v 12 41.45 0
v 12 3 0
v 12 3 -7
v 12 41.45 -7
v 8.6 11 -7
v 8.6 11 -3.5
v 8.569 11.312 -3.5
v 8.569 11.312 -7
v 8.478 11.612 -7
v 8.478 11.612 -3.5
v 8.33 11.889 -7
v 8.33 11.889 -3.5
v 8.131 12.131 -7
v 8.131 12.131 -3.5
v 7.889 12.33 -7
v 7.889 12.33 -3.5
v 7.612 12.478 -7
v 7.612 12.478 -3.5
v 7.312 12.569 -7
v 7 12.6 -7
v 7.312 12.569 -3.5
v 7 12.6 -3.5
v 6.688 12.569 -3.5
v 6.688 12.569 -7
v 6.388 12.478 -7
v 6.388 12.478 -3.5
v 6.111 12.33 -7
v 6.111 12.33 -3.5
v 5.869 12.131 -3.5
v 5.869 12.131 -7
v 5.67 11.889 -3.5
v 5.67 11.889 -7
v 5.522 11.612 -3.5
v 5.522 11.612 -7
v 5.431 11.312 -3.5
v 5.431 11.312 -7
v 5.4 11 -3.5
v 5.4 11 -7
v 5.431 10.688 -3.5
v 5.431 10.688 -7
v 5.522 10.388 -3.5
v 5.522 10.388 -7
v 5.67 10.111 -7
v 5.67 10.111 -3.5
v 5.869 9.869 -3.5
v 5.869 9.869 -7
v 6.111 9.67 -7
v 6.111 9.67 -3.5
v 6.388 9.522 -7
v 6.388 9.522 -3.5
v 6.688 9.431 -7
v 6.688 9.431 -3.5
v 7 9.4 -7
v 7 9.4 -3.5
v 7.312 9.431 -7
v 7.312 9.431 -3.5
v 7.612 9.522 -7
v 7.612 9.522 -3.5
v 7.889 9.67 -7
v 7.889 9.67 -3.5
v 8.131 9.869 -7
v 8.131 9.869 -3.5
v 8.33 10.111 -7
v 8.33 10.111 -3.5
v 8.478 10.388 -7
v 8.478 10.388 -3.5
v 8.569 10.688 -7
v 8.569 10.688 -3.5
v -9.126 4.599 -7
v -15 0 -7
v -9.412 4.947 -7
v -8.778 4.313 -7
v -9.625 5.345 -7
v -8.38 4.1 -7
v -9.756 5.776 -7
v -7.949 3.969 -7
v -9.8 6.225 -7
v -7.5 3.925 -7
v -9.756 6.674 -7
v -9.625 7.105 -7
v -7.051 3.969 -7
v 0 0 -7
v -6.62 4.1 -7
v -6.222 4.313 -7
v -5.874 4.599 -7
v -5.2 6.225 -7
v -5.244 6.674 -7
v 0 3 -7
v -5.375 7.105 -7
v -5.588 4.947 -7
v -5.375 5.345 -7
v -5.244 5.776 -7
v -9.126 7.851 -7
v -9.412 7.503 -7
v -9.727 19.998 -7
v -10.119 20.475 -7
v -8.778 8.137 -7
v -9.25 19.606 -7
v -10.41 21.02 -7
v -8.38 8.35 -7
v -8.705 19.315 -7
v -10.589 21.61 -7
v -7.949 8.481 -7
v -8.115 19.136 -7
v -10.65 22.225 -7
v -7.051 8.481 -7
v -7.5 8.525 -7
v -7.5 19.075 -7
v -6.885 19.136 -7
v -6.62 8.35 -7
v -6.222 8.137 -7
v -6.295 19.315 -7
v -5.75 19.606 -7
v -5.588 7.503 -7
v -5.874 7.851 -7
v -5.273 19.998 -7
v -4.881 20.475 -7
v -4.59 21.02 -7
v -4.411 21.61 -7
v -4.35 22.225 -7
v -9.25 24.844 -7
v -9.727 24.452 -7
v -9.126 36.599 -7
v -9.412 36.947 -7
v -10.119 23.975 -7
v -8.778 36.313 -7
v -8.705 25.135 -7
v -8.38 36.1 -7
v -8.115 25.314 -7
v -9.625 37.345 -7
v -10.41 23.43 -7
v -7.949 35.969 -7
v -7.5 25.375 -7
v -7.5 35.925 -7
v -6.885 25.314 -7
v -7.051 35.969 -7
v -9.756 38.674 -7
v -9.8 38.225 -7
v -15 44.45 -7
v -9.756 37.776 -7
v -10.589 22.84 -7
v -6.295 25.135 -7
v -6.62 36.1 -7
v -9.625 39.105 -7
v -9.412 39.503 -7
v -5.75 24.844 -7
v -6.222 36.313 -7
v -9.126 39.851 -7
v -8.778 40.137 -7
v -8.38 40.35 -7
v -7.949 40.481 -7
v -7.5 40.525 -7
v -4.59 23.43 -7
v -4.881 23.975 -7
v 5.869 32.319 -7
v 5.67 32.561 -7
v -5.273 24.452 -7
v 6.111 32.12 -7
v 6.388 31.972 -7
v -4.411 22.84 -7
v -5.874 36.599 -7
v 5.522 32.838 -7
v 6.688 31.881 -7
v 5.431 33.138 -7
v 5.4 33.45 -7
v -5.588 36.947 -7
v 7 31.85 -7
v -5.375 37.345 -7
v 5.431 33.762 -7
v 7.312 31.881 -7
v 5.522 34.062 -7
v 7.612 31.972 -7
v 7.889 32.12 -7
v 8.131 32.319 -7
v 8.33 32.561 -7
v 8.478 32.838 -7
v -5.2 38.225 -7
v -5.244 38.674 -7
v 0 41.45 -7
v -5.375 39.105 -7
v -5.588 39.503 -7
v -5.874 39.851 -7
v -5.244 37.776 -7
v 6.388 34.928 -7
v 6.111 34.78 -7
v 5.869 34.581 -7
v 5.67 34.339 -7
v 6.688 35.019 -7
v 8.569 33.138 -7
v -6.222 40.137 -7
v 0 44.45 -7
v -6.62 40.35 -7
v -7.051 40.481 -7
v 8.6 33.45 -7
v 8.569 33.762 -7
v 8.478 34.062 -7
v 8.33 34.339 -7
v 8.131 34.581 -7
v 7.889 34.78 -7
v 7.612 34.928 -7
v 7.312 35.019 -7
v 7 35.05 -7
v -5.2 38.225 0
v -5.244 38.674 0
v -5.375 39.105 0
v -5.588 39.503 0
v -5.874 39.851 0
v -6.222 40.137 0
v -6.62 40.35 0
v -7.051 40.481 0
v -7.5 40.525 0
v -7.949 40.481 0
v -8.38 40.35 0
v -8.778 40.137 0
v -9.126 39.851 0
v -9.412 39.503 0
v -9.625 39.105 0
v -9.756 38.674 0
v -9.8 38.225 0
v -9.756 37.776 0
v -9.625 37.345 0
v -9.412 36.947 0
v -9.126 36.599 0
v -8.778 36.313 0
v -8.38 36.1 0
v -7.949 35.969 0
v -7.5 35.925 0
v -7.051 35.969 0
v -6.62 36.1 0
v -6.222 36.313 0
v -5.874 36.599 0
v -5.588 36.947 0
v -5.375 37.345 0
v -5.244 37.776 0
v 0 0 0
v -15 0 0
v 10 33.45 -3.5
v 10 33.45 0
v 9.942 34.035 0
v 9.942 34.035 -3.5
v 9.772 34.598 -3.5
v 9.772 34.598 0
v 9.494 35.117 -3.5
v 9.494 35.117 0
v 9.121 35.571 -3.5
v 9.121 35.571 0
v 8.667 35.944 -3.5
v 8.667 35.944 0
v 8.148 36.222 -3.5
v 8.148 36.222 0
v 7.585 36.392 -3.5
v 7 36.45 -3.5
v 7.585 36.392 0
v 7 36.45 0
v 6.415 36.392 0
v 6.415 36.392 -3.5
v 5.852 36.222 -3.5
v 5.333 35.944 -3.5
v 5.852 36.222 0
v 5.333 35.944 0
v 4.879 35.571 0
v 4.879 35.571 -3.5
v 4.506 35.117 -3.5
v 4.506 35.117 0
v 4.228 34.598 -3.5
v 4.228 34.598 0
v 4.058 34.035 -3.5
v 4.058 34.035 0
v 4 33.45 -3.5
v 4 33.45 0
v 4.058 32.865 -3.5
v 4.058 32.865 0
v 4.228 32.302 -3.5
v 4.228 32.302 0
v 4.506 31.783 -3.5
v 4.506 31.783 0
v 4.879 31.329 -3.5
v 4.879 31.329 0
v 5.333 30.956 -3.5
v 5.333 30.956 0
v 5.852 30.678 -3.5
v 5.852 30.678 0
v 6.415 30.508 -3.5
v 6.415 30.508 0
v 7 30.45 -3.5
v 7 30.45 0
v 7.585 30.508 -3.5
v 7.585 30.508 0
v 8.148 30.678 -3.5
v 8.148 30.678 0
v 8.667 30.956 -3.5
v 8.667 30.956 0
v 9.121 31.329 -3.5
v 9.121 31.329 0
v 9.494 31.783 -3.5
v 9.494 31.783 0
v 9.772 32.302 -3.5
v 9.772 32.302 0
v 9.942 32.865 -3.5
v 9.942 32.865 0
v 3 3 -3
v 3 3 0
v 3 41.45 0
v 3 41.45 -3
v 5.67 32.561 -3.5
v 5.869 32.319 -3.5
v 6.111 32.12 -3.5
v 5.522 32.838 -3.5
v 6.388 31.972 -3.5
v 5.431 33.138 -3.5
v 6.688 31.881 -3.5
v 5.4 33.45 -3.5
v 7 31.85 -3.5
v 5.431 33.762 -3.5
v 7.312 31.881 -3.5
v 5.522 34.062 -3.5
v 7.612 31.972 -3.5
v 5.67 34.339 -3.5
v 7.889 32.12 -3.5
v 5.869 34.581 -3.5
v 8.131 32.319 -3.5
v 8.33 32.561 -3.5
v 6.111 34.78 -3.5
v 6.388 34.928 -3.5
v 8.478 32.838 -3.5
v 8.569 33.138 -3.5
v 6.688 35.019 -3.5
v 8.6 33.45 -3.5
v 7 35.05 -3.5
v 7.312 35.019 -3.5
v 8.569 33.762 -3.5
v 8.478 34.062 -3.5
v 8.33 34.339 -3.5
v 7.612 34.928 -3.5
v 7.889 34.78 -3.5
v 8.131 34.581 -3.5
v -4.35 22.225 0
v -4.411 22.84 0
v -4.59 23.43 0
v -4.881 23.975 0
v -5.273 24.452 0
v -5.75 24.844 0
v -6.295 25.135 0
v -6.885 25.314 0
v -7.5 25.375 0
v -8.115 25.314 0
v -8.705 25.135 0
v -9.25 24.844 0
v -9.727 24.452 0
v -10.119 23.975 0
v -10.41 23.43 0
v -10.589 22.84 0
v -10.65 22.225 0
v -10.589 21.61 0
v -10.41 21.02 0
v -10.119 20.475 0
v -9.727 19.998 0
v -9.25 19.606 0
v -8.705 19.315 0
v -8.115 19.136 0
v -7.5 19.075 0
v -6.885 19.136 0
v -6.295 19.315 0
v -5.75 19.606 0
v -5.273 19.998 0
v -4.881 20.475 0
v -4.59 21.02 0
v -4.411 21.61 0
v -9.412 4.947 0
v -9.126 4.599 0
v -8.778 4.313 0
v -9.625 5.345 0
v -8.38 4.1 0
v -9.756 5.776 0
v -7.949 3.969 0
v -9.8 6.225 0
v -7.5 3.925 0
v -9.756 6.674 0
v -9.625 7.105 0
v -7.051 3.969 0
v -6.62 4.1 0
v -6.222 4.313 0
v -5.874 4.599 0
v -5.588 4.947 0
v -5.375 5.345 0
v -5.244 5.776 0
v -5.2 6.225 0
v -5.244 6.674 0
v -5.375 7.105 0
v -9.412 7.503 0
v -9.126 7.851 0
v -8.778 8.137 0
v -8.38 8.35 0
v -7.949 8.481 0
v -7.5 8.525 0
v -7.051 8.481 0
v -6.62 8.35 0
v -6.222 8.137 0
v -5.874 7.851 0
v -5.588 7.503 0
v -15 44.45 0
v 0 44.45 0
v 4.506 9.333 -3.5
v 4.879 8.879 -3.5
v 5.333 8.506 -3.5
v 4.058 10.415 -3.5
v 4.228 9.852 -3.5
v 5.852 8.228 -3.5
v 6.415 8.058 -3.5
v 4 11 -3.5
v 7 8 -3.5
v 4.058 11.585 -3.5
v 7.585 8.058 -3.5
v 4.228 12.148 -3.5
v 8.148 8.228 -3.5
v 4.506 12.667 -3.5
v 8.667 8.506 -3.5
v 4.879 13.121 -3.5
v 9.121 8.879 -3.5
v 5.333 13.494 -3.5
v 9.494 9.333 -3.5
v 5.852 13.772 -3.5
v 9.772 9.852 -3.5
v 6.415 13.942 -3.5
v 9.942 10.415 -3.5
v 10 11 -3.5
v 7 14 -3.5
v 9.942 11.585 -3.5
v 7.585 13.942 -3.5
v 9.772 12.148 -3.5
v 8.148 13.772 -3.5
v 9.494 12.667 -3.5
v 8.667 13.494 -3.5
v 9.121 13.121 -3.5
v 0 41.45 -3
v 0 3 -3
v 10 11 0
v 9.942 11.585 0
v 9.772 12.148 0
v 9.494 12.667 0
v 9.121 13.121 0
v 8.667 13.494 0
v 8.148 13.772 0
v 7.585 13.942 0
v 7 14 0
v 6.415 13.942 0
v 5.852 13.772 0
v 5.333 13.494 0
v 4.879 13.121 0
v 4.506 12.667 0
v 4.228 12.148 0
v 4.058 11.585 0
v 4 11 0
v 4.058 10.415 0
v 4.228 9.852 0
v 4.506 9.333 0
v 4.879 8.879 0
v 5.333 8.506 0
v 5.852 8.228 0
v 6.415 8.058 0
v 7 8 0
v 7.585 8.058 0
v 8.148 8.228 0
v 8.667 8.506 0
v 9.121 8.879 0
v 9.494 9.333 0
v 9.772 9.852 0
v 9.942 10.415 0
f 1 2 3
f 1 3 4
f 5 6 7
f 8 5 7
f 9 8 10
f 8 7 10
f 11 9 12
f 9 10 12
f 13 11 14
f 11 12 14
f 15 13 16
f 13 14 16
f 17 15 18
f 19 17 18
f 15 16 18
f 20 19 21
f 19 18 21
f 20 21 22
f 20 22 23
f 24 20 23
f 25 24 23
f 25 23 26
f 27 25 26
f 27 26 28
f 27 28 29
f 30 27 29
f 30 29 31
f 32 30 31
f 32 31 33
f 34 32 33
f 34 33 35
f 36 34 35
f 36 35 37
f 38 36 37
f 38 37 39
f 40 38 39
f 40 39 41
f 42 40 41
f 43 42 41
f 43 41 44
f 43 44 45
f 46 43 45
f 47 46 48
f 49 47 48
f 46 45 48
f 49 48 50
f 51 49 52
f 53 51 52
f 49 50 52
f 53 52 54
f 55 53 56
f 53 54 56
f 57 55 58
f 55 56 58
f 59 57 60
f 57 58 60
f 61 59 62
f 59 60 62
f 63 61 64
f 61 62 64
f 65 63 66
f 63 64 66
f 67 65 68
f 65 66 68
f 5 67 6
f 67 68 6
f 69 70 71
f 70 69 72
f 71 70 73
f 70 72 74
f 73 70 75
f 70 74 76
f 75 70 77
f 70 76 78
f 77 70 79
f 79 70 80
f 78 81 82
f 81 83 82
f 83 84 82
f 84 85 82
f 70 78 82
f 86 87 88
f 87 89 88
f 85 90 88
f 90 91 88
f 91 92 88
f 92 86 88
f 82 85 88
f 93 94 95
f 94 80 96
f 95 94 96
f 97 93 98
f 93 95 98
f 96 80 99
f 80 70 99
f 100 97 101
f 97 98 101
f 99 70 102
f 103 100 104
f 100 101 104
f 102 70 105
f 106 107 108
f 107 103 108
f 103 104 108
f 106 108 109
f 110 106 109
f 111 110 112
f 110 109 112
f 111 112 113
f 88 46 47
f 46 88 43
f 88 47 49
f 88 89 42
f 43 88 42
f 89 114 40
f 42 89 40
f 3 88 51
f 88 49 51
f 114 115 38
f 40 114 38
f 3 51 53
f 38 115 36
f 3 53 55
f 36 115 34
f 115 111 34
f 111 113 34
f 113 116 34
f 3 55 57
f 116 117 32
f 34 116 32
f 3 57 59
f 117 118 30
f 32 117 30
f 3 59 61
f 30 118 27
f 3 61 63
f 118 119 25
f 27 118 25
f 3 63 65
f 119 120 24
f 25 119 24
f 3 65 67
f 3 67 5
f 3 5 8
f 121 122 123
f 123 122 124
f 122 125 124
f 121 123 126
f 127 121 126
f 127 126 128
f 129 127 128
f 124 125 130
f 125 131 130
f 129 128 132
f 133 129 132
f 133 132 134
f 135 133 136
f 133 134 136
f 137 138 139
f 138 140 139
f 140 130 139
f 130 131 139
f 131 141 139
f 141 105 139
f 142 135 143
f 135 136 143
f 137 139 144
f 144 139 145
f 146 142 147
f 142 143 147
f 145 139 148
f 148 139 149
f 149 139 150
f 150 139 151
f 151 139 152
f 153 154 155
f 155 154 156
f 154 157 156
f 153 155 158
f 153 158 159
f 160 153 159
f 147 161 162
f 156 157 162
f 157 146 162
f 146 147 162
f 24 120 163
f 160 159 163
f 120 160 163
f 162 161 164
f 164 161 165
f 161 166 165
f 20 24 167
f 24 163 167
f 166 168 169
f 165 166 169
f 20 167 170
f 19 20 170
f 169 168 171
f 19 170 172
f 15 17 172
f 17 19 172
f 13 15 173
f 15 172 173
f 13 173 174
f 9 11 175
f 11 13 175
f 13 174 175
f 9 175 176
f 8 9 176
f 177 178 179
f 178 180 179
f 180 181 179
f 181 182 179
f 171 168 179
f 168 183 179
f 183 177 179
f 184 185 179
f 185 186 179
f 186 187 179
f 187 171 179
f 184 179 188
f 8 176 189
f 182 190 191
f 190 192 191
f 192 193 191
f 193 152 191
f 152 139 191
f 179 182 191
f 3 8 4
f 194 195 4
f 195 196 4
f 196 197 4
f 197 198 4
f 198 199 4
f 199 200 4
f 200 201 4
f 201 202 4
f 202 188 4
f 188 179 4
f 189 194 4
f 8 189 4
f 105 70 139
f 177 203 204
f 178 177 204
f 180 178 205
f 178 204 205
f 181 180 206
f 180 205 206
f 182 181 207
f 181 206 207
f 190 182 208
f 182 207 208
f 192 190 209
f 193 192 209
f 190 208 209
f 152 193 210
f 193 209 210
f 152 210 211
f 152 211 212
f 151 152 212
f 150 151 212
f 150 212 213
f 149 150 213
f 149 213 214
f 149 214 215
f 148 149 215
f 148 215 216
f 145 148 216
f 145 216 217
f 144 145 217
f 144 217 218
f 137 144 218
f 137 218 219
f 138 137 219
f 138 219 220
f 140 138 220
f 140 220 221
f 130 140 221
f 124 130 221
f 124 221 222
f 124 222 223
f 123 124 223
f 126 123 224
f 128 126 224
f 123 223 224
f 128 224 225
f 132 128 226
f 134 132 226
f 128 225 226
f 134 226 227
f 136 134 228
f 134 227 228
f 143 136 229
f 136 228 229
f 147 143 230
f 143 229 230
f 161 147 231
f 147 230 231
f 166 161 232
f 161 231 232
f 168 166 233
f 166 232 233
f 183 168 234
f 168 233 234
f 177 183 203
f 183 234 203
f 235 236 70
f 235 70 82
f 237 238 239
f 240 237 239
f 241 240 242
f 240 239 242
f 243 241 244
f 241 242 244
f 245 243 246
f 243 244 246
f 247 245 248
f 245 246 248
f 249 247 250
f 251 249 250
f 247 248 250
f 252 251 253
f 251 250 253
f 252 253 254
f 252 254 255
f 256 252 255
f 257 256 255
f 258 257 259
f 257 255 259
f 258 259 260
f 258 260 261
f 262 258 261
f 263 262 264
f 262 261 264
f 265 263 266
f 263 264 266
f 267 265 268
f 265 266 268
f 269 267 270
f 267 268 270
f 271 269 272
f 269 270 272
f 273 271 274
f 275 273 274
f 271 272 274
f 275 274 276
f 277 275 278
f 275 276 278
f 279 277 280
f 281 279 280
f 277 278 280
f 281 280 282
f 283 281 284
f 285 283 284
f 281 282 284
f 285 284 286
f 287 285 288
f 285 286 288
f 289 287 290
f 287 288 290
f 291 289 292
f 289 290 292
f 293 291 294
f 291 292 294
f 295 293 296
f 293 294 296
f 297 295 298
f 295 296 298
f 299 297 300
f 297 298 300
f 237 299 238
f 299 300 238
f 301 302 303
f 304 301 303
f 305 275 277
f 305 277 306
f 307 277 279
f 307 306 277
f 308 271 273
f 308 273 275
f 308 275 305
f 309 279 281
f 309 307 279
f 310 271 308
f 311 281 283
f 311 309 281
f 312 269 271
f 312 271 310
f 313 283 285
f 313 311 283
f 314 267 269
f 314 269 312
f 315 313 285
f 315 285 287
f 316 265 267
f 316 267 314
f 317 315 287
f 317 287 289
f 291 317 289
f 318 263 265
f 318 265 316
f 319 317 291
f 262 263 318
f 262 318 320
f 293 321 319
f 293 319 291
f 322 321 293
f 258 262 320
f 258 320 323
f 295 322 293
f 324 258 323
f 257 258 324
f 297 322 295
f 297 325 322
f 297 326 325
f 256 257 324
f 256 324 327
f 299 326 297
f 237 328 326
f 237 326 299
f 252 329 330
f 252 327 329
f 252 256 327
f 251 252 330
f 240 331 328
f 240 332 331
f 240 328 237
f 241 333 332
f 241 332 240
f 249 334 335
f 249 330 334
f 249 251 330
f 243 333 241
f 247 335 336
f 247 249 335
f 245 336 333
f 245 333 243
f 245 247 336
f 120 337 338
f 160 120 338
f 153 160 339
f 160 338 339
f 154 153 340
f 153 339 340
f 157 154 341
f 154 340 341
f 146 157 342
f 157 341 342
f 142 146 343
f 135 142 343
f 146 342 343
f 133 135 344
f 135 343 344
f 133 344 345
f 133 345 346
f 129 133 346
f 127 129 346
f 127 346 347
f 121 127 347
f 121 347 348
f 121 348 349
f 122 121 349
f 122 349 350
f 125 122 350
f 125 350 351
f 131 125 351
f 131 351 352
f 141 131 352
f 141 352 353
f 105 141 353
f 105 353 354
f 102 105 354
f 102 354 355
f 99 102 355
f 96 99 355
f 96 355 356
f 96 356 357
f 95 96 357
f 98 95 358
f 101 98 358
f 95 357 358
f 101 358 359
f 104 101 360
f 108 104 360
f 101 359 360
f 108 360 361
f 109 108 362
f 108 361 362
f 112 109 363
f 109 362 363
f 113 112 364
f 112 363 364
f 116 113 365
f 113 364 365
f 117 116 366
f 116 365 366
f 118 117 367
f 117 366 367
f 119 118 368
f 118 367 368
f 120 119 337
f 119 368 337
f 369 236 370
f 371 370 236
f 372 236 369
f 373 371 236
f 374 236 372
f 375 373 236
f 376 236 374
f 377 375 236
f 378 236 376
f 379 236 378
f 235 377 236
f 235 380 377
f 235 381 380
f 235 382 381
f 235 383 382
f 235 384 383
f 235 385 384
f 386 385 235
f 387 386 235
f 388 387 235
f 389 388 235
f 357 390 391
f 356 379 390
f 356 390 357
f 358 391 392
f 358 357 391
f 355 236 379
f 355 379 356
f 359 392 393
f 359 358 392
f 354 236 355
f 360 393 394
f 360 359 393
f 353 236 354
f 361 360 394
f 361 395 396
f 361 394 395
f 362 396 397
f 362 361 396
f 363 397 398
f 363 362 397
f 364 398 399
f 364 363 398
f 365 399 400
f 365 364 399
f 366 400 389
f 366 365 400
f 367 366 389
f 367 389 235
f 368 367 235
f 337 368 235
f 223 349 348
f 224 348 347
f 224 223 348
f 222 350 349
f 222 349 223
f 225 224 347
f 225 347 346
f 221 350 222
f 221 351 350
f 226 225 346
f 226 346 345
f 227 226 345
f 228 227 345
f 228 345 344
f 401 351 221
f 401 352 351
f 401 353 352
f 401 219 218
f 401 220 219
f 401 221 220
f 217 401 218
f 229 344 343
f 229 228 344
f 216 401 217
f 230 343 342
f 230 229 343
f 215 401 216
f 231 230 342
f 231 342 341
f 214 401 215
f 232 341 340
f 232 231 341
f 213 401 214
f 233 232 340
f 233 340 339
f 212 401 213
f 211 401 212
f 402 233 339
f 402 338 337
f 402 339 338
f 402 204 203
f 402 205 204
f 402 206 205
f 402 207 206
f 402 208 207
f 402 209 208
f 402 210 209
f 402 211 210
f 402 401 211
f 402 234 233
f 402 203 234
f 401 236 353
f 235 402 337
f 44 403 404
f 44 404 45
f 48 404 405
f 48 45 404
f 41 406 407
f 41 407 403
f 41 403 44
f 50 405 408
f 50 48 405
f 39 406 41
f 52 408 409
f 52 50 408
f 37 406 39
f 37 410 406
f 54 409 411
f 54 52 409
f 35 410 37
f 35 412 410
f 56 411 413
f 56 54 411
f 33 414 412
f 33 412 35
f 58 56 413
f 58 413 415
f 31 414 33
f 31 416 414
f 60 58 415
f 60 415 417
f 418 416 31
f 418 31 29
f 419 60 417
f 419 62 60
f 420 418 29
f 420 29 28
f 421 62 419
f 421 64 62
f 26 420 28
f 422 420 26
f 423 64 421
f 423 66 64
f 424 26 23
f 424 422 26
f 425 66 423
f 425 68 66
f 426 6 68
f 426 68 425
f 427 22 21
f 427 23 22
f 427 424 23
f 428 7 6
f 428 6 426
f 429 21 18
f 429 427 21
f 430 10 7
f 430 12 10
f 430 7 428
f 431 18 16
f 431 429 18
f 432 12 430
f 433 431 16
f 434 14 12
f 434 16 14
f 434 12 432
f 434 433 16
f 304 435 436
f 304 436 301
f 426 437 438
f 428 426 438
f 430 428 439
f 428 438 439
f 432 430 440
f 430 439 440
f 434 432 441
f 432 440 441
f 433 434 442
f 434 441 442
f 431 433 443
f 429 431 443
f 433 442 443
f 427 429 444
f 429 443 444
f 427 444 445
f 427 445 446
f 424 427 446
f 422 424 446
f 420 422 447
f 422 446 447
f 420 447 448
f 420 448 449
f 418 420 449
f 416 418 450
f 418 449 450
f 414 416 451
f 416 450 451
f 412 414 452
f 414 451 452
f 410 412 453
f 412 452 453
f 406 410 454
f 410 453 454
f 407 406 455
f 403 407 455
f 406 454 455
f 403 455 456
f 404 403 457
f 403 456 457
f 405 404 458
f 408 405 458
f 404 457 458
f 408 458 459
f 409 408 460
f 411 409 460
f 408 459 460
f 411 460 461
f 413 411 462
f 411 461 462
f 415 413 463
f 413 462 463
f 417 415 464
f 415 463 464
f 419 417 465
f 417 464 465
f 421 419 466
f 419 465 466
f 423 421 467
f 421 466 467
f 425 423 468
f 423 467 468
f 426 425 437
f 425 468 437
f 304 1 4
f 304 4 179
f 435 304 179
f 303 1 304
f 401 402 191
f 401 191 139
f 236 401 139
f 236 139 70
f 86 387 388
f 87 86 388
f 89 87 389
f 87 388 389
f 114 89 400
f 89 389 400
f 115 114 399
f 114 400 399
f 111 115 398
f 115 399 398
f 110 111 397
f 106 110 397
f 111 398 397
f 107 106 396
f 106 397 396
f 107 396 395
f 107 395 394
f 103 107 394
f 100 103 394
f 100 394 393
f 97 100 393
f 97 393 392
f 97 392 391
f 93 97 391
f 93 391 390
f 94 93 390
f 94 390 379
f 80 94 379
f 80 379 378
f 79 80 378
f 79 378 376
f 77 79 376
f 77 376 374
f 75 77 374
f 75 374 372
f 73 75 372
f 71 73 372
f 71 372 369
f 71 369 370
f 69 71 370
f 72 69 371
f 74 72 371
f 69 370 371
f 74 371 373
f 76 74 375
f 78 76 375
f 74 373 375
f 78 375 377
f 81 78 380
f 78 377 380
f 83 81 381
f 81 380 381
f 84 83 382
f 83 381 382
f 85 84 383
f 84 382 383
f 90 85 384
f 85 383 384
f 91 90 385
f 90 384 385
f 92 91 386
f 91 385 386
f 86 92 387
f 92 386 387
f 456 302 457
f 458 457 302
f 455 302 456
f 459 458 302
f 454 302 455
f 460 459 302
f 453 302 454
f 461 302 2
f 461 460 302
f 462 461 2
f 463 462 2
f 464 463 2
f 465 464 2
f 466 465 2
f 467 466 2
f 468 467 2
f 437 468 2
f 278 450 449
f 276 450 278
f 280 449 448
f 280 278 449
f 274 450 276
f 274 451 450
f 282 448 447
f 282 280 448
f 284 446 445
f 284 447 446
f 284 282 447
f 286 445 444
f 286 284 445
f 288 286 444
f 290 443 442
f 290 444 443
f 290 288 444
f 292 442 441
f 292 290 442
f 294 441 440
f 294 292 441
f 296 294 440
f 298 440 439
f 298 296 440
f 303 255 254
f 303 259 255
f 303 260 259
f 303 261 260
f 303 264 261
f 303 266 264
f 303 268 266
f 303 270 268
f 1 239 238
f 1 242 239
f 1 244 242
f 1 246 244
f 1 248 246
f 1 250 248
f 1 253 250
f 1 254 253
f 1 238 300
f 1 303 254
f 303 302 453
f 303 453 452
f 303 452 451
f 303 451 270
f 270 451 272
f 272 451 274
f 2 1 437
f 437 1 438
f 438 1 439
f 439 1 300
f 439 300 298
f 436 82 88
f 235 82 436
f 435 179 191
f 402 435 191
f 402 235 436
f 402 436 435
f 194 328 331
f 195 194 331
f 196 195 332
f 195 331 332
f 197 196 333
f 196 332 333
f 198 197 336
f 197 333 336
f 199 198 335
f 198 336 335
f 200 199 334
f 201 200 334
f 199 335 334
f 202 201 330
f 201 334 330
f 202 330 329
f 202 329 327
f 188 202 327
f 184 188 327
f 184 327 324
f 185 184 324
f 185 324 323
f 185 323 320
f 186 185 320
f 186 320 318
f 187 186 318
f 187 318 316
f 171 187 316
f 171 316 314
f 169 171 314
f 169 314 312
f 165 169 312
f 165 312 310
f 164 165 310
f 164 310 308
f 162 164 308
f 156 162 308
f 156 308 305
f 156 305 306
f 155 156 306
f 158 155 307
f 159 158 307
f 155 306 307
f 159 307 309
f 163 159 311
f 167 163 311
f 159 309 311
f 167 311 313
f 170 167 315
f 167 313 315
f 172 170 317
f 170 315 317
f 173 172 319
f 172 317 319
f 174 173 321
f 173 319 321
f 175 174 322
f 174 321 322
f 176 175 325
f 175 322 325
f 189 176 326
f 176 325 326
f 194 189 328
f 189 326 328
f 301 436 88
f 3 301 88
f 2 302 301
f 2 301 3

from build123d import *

# Parameters (mm, degrees)
TABPAD_DEPTH               = 7
LIPPOCKETSKETCH001_W       = 3
LIPPOCKETSKETCH001_H       = 38.45
LIPGROOVEPOCKET_DEPTH      = 3
RAILHOLESSKETCH_R          = 2.3
RAILHOLESSKETCH_R_2        = 3.15
RAILHOLESPOCKET_DEPTH      = 7.001
TABJOINTCLEARSKETCH_R      = 1.6
TABJOINTCLEARPOCKET_DEPTH  = 7.001
TABCOUNTERBORESKETCH_R     = 3
TABCOUNTERBOREPOCKET_DEPTH = 3.5


with BuildPart() as part:
    # TabProfileSketch → TabPad (new body)
    with BuildSketch(Plane.XY):
        Polygon((-15, 0), (0, 0), (0, 3), (12, 3), (12, 41.45), (0, 41.45), (0, 44.45), (-15, 44.45), align=None)
    extrude(amount=-TABPAD_DEPTH)

    # LipPocketSketch001 → LipGroovePocket (cut)
    with BuildSketch(Plane.XY):
        with Locations((1.5, 22.225)):
            Rectangle(LIPPOCKETSKETCH001_W, LIPPOCKETSKETCH001_H)
    extrude(amount=-LIPGROOVEPOCKET_DEPTH, mode=Mode.SUBTRACT)

    # RailHolesSketch → RailHolesPocket (cut, through all)
    with BuildSketch(Plane.XY):
        with Locations((-7.5, 6.225)):
            Circle(RAILHOLESSKETCH_R)
        with Locations((-7.5, 22.225)):
            Circle(RAILHOLESSKETCH_R_2)
        with Locations((-7.5, 38.225)):
            Circle(RAILHOLESSKETCH_R)
    extrude(amount=-RAILHOLESPOCKET_DEPTH, mode=Mode.SUBTRACT)

    # TabJointClearSketch → TabJointClearPocket (cut, through all)
    with BuildSketch(Plane.XY):
        with Locations((7, 11)):
            Circle(TABJOINTCLEARSKETCH_R)
        with Locations((7, 33.45)):
            Circle(TABJOINTCLEARSKETCH_R)
    extrude(amount=-TABJOINTCLEARPOCKET_DEPTH, mode=Mode.SUBTRACT)

    # TabCounterboreSketch → TabCounterborePocket (cut)
    with BuildSketch(Plane.XY):
        with Locations((7, 11)):
            Circle(TABCOUNTERBORESKETCH_R)
        with Locations((7, 33.45)):
            Circle(TABCOUNTERBORESKETCH_R)
    extrude(amount=-TABCOUNTERBOREPOCKET_DEPTH, mode=Mode.SUBTRACT)


solid = part.part
